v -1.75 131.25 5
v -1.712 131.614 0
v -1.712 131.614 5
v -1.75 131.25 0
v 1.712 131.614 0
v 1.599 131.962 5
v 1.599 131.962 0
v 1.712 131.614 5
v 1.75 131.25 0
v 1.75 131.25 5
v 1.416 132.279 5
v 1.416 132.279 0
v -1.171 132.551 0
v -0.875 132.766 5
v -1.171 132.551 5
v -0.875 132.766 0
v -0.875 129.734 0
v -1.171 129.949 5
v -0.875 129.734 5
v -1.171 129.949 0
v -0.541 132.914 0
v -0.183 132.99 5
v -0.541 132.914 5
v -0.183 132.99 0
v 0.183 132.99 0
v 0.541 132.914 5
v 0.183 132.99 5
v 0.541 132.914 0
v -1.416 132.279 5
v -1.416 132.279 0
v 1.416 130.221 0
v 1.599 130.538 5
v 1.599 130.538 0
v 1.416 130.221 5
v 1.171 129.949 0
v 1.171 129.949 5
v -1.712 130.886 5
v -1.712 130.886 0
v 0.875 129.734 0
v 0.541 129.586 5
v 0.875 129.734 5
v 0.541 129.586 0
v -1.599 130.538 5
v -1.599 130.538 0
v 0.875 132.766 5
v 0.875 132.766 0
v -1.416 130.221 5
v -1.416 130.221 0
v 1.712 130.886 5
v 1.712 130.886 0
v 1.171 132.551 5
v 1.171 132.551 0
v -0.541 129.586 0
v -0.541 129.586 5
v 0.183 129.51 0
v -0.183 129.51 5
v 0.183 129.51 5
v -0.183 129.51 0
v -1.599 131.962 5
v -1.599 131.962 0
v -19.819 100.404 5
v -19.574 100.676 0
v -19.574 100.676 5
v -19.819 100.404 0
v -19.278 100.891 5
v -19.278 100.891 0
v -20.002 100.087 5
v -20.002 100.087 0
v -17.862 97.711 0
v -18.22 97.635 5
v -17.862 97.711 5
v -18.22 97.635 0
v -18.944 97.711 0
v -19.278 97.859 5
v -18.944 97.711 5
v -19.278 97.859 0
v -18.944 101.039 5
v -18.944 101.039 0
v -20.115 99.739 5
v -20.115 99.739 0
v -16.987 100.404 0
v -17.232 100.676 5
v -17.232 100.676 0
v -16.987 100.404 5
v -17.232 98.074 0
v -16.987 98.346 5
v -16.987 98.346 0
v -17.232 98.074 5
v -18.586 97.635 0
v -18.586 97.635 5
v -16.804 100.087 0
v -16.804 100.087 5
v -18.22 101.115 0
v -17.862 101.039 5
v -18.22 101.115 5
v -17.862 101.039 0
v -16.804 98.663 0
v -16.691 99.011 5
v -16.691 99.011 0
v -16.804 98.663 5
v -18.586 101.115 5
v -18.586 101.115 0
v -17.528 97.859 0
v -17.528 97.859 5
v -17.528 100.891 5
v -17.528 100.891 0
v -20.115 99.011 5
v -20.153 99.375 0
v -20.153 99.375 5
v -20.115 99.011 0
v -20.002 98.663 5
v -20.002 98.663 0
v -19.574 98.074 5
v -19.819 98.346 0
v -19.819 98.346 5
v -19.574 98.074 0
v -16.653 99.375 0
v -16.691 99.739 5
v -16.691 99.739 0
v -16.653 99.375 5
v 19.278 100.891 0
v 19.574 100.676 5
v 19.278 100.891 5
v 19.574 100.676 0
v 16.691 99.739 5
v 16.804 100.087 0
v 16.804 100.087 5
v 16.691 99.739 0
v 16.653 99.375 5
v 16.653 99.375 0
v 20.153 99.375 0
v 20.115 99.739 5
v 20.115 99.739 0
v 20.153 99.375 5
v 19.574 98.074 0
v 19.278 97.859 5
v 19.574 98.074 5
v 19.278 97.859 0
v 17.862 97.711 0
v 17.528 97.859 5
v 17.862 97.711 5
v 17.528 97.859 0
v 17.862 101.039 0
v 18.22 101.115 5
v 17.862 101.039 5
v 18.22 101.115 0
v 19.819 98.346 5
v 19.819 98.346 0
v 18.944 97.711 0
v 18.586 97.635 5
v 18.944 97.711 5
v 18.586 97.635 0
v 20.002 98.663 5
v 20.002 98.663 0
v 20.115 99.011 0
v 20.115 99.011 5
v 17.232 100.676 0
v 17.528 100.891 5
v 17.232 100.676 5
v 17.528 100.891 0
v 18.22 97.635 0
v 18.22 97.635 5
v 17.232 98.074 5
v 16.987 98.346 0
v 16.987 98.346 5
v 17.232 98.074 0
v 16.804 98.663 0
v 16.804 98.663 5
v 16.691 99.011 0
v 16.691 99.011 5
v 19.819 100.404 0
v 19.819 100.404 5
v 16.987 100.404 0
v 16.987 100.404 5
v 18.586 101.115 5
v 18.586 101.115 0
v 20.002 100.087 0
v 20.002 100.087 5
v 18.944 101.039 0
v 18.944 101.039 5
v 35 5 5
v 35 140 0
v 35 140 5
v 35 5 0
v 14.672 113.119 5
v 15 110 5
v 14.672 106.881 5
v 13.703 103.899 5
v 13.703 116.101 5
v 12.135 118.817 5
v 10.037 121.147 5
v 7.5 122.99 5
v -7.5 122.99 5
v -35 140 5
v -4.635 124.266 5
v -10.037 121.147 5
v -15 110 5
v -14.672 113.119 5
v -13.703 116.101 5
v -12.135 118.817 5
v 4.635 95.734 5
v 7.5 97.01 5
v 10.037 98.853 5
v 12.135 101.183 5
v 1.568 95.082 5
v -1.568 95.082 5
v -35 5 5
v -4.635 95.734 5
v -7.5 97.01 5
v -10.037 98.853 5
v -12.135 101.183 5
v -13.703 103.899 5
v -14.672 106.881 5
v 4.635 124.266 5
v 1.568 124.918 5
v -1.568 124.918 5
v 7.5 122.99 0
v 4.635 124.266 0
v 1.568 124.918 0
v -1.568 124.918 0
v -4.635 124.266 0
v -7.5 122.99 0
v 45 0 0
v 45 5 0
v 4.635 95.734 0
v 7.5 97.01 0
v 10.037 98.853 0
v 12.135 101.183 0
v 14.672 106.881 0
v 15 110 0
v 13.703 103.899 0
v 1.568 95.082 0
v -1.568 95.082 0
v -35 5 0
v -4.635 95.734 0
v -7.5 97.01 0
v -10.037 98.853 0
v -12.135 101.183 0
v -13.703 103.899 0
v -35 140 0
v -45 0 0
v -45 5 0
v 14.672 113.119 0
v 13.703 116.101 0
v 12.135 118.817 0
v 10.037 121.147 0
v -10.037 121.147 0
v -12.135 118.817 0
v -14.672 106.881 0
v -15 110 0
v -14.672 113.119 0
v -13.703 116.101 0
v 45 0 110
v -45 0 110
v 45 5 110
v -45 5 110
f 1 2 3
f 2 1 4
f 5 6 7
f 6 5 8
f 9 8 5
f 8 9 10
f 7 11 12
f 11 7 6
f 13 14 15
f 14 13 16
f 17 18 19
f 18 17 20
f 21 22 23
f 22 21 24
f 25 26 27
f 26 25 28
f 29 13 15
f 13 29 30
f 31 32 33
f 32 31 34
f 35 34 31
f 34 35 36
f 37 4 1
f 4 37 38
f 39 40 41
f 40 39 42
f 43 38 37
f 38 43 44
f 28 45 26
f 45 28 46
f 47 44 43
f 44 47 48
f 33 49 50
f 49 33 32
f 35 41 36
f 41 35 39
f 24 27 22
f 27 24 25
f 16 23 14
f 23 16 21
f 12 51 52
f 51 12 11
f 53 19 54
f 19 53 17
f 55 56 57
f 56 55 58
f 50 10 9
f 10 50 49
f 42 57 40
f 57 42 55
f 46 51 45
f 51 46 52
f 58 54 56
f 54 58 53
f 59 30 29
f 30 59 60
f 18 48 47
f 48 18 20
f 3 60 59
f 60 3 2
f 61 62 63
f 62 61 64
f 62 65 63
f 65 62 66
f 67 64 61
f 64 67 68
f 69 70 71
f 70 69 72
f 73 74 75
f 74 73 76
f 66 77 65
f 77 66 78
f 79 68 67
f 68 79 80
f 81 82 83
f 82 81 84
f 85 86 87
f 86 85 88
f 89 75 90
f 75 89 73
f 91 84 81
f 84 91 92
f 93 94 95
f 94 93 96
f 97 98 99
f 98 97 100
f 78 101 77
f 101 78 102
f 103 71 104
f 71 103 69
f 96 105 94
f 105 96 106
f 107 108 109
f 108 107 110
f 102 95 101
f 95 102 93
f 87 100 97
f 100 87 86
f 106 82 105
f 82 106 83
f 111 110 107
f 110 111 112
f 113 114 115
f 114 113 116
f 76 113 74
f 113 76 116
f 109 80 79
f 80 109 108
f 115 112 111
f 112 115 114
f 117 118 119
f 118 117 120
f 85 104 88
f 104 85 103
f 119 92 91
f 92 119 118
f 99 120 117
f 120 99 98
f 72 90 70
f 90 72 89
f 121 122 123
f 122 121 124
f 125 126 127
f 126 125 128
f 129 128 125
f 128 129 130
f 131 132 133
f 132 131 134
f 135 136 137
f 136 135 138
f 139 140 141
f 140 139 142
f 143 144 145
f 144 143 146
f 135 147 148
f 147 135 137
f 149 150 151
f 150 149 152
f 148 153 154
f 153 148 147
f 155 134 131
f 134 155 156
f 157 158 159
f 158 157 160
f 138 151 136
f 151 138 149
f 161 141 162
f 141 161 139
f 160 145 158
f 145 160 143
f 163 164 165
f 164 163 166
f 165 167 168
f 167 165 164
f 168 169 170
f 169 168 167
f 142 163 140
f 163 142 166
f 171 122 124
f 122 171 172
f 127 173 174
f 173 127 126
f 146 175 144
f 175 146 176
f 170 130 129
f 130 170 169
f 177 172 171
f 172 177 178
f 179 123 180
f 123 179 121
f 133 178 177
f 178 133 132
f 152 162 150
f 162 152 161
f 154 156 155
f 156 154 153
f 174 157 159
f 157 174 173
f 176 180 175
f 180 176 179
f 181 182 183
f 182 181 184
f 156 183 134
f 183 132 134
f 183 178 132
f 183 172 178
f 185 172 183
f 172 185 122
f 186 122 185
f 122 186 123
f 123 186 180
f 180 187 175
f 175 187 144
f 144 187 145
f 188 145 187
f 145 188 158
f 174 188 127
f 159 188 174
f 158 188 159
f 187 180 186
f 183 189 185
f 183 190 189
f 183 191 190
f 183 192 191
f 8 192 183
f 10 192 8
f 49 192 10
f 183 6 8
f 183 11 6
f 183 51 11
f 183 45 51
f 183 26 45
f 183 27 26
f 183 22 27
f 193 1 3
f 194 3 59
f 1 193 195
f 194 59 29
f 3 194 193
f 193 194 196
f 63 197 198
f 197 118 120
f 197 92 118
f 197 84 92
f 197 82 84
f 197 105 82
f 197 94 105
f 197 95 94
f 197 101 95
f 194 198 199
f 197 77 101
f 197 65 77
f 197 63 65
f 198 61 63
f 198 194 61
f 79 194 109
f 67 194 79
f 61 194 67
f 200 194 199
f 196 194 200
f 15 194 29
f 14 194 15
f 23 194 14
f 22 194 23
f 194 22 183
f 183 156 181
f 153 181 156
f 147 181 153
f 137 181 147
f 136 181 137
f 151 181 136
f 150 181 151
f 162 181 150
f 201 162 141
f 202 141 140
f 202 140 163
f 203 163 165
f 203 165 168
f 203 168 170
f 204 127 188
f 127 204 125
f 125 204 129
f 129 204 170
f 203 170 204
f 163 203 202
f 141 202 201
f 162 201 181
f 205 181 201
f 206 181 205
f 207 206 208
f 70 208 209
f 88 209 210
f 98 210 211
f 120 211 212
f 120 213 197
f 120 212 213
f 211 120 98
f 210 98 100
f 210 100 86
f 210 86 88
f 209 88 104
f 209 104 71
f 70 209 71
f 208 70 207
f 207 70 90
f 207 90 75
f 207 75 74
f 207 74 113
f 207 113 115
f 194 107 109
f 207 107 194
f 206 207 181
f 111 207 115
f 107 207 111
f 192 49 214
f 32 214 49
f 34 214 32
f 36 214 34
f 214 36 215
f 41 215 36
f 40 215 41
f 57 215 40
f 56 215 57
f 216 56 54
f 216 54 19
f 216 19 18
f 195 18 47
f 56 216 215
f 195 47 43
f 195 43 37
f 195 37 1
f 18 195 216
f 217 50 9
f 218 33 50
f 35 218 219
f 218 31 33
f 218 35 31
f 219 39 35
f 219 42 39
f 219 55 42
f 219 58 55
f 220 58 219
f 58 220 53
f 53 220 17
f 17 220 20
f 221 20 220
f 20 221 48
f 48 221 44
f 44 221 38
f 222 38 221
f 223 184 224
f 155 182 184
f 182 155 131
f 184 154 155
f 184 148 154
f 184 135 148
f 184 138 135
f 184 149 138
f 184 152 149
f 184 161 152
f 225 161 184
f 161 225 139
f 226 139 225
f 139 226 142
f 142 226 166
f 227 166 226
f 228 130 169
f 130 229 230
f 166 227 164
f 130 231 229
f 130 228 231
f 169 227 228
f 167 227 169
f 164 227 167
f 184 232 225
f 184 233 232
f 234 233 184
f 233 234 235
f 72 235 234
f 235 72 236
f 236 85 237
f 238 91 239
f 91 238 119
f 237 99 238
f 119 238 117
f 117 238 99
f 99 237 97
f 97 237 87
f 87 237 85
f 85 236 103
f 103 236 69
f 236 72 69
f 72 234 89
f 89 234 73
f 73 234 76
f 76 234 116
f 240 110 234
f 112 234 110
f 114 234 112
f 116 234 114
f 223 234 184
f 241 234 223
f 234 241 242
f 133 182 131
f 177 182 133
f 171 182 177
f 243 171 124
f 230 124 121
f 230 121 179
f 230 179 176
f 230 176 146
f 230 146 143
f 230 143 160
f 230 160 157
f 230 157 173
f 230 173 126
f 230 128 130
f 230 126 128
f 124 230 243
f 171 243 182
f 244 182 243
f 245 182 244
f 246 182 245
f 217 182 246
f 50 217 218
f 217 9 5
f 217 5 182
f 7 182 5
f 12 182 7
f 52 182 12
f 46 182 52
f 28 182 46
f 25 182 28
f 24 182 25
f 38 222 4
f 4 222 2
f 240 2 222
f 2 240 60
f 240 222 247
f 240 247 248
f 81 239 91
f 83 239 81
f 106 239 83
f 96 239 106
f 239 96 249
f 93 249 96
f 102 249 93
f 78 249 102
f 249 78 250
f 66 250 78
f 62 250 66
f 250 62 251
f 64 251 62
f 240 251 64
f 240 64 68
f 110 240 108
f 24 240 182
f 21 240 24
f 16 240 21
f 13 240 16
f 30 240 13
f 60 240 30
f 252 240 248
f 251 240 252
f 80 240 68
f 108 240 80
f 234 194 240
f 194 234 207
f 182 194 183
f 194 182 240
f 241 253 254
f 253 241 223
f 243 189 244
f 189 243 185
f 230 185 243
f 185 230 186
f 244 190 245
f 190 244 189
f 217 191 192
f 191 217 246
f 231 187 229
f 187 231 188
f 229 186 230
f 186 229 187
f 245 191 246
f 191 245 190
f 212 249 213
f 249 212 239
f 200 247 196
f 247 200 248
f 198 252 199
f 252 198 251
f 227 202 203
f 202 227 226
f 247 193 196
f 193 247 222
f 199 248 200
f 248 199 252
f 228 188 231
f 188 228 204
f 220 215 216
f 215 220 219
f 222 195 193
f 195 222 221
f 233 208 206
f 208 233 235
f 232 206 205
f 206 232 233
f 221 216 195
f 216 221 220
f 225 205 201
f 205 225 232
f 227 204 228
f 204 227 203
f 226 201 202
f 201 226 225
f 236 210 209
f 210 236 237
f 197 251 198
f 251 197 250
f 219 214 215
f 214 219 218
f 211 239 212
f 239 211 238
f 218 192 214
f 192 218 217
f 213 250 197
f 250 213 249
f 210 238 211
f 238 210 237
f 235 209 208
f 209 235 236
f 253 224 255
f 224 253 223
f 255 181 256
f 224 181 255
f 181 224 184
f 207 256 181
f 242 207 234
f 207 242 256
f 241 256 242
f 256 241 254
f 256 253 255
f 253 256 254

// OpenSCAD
module holder()
{
  translate([0,0,110])
    rotate([90,0,0])
      difference()
      {
        translate([-70/2, -110, 0])
          cube([70, 140, 5]);
        cylinder(r=30/2, h=5, $fs=0.01);
        for(deg = [0, 120, 240])
          rotate(deg)
            #translate([0, 21.25, -1])
              cylinder(r=3.5/2, h=5+2*1, $fs=0.1);
      }
}

rotate([-90, 0, 0])
{
  holder();
  translate([-90/2, -110, 0])
    cube([90, 110, 5]);
}
